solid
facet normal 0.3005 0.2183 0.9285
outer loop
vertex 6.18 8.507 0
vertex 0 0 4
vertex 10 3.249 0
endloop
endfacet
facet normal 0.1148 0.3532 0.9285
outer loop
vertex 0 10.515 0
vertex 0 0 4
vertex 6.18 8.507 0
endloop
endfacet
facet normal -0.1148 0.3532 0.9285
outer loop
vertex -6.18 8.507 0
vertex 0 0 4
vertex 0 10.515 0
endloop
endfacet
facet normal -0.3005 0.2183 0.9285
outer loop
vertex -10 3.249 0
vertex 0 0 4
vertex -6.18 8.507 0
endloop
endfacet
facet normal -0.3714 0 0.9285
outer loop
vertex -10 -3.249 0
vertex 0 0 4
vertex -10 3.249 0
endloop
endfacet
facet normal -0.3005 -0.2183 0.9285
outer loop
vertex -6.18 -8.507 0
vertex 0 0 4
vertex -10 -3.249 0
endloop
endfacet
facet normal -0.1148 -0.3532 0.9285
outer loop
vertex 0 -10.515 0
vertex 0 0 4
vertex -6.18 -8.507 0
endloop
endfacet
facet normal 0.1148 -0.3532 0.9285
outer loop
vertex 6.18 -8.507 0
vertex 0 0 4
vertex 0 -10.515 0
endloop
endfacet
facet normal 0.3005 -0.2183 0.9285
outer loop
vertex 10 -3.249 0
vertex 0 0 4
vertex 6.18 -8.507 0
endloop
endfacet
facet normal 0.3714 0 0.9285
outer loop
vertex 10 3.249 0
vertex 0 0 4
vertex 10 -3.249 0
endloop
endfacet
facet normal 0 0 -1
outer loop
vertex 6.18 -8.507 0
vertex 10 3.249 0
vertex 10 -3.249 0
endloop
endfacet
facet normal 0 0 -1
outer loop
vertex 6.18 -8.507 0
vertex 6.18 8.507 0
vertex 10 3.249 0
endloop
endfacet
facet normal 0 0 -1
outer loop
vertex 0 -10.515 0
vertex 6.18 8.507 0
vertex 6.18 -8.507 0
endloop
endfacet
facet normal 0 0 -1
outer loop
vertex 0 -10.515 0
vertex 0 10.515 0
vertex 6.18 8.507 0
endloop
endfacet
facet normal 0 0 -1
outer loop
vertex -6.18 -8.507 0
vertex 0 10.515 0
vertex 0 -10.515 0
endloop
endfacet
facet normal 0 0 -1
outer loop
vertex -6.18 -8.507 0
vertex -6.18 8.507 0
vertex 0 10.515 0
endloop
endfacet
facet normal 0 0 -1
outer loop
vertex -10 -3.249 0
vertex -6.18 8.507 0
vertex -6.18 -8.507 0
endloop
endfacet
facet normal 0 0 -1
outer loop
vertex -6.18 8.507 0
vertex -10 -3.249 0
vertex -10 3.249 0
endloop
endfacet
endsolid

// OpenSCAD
// file: transformations_oblomobka.scad
// Transformations
// (C) @oblomobka - 2014
// GPL3

// Transforma una forma en un sector según un ángulo dado.

module sector(	angle, 	// es el ángulo del sector, lo que quedará de la forma original
				d,		// valor auxiliar, será como mínimo igual al diámetro del cilindro que envuelve la forma original
				h		// valor auxiliar, será como mínimo igual a la altura del cilindro que envuelve la forma original
				){

POINTS=[	[0,0,-h],
		[0,0,h],
		[d*cos(0*angle/4),d*sin(0*angle/4),-h],
		[d*cos(0*angle/4),d*sin(0*angle/4),h],
		[d*cos(1*angle/4),d*sin(1*angle/4),-h],
		[d*cos(1*angle/4),d*sin(1*angle/4),h],
		[d*cos(2*angle/4),d*sin(2*angle/4),-h],
		[d*cos(2*angle/4),d*sin(2*angle/4),h],
		[d*cos(3*angle/4),d*sin(3*angle/4),-h],
		[d*cos(3*angle/4),d*sin(3*angle/4),h],
		[d*cos(4*angle/4),d*sin(4*angle/4),-h],
		[d*cos(4*angle/4),d*sin(4*angle/4),h],
		];

TRIANGLES=[	[0,1,2],
			[1,3,2],
			[2,3,4],
			[3,5,4],
			[4,5,6],
			[5,7,6],
			[6,7,8],
			[7,9,8],
			[8,9,10],
			[9,11,10],
			[10,11,0],
			[11,1,0],

			[5,3,1],
			[7,5,1],
			[9,7,1],
			[11,9,1],
			[0,2,4],
			[0,4,6],
			[0,6,8],
			[0,8,10]
			];

if(angle<=0 || angle>=360){
	child();
	}
	else{
		intersection(){
			polyhedron(points=POINTS,triangles=TRIANGLES);
			child();
			}
		}
}

//sector (150,40,10)cylinder(r=20,h=10); // Ejemplo de uso de la tansformación sector()
// file: functions_ext.scad
// Funciones sacadas de otras librerías y de diferentes autores

include <constants_oblomobka.scad>

/* A circular helix of radius a and pitch 2πb is described by the following parametrisation:
x(t) = a*cos(t),
y(t) = a*sin(t),
z(t) = b*t
Licensed under the MIT license.
© 2010 by Elmo Mäntynen
*/
function b(pitch) = pitch/(TAU);
function t(pitch, z) = z/b(pitch);
function helix_curve(pitch, radius, z) = [radius*cos(deg(t(pitch, z))), radius*sin(deg(t(pitch, z))), z];


/* Utility functions.
 * Originally by Hans Häggström, 2010.
 * Dual licenced under Creative Commons Attribution-Share Alike 3.0 and LGPL2 or later
 */
function distance(a, b) = sqrt( (a[0] - b[0])*(a[0] - b[0]) +
                                (a[1] - b[1])*(a[1] - b[1]) +
                                (a[2] - b[2])*(a[2] - b[2]) );

function length2(a) = sqrt( a[0]*a[0] + a[1]*a[1] );

function normalized(a) = a / (max(distance([0,0,0], a), 0.00001));

function normalized_axis(a) = 	a == "x" ? [1, 0, 0]:
                  			 	a == "y" ? [0, 1, 0]:
                   				a == "z" ? [0, 0, 1]: normalized(a);

function angleOfNormalizedVector(n) = [0, -atan2(n[2], length2([n[0], n[1]])), atan2(n[1], n[0]) ];

function angle(v) = angleOfNormalizedVector(normalized(v));

function angleBetweenTwoPoints(a, b) = angle(normalized(b-a));
// file: functions_oblomobka.scad
// Functions
// (C) @oblomobka - 2014
// GPL3

include <constants_oblomobka.scad>

// da el diámetro interior del cono(d1,d2,h) a una altura interior(hi) conocida
function di_cone(d1,d2,h,hi)=d2+(d1-d2)*(1-hi/h);

// da la altura interior del cono(d1,d2,h) a un diametro(di) conocido
function hi_cone(d1,d2,h,di)=-h*((di-d2)/(d1-d2)-1);

// 
function r_circle_intersection (d1,d2)=sqrt(pow(d1/2,2)-pow(d2/2,2));

// Relaciones entre radio, apotema y lado en un polígono de n lados
function side_apothem (apothem,n)=apothem*2*tan(180/n);
function apothem_radius(radius,n)=radius*cos(180/n);
function radius_apothem(apothem,n)=apothem/cos(180/n);
function side_radius (radius,n)=radius*2*sin(180/n);

// limita los posibles valores de x, que siempre estarán comprendidos entre un minimo(a) y un maximo(z)
function lim(a,x,z)=max(a,min(x,z));

// transforma angulo, radianes --> hexadecimal
function deg(angle) = 180*angle/PI;
// transforma angulo, hexadecimal --> radianes
function rad(angle) = angle*PI/180;
// file: constants_oblomobka.scad
// números transcendentes

TAU = 2*PI; //6.2831853071 (PI ya está definido en Openscad)
EULER=2.71828282;


// números algebraicos

PHI=(1+sqrt(5))/2;


// Vectores

X = [1, 0, 0];
Y = [0, 1, 0];
Z = [0, 0, 1];
// main file
// Shapes
// (C) @oblomobka - 2014
// GPL3

include <constants_oblomobka.scad>
include <functions_oblomobka.scad>
include <functions_ext.scad>

use <transformations_oblomobka.scad>

// --- Piramide con base circunscrita en un círculo definido en las variables
module pyramid_circumscribed (	n=4,			// nº lados de la base de la pirámide	
								d1=20,		// diámetro del círculo-base donde se circunscribe la pirámide
								d2=0,		// diámetro del círculo-punta donde se circunscribe la pirámide
								h=10			// altura de la pirámide
								){

if(n%2==0){
	rotate([0,0,180/n])
		cylinder (r1=d1/2/cos(180/n), r2=d2/2/cos(180/n), h=h, $fn=n);
	}
	else{
		rotate([0,0,90/n])
			cylinder (r1=d1/2/cos(180/n), r2=d2/2/cos(180/n), h=h, $fn=n);
		}

}
// ------- pyramid_circumscribed (n=n,d1=d1,d2=d2,h=h); -----------------

// --- Prisma con base circunscrita en un círculo definido en las variables
module prism_circumscribed (	n=4,			// nº lados de la base del prisma
							d=20,		// diámetro del círculo donde se circunscribe el prisma
							h=10			// altura del prisma
							){
if(n%2==0){
	rotate([0,0,180/n])
		cylinder (r=d/2/cos(180/n), h=h, $fn=n);
	}
	else{
		rotate([0,0,90/n])
			cylinder (r=d/2/cos(180/n), h=h, $fn=n);
		}
}
// ------- prism_circumscribed (n=n,d=d,h=h); -----------------



// Toros

// Definido por el diámetro exterior y el diámetro del círculo en revolución
module torusOD (d1,d2,resolution){
$fn=resolution;	
rotate_extrude(){
	translate([d1/2-d2/2,0,0])
		circle(r=d2/2);
	}
}

// Definido por el diámetro exterior y el diámetro interior
module torusOI (d1,d2,resolution){
$fn=resolution;	
d=(d1-d2)/2;
rotate_extrude(){
	translate([d1/2-d/2,0,0])
		circle(r=d/2);
	}
}

// Definido por el diámetro de la línea neutra y el diámetro del círculo en revolución
module torusND (d1,d2,resolution){
$fn=resolution;	
rotate_extrude(){
	translate([d1/2,0,0])
		circle(r=d2/2);
	}
}

module torus_sector(d1,d2,angle=360,mode=1,extreme=true,resolution=32){

if(angle<=0 || angle>=360){
	if(mode==1){torusOD(d1,d2,resolution=resolution);}
	else{if(mode==2){torusND(d1,d2,resolution=resolution);}
	else{if(mode==3){torusOI(d1,d2,resolution=resolution);}}}
	}

else{
	if(mode==1){
		union(){
			sector(angle,d1,d2/2)torusOD(d1,d2,resolution=resolution);
			if(extreme==true){
				translate([d1/2-d2/2,0,0])sphere(d2/2,$fn=resolution);
				translate([(d1/2-d2/2)*cos(angle),(d1/2-d2/2)*sin(angle),0])sphere(d2/2,$fn=resolution);
				}
			}
		}
	else{
		if(mode==2){
			union(){
				sector(angle,d1+d2,d2/2)torusND(d1,d2,resolution=resolution);
				if(extreme==true){
					translate([d1/2,0,0])sphere(d2/2,$fn=resolution);
					translate([d1/2*cos(angle),d1/2*sin(angle),0])sphere(d2/2,$fn=resolution);
					}
				}
			}
		else{
			if(mode==3){
				union(){
					sector(angle,d1,(d1-d2)/4)torusOI(d1,d2,resolution=resolution);
					if(extreme==true){
						translate([d1/2-(d1-d2)/4,0,0])sphere((d1-d2)/4,$fn=resolution);
						translate([(d1/2-(d1-d2)/4)*cos(angle),(d1/2-(d1-d2)/4)*sin(angle),0])sphere((d1-d2)/4,$fn=resolution);
						}
					}
				}
			}
		}
	}
}


// Tubos

module tubeOT (d,t,h,resolution=resolution){	
	difference(){
		cylinder(r=d/2,h=h,$fn=resolution);
		cylinder(r=(d-2*t)/2,h=3*h,center=true,$fn=resolution);
		}
}

// Definido por el diámetro exterior y el diámetro interior
module tubeOI (d1,d2,h,resolution=resolution){
	difference(){
		cylinder(r=d1/2,h=h,$fn=resolution);
		cylinder(r=d2/2,h=3*h,center=true,$fn=resolution);	
		}
}

// Definido por el diámetro de la línea neutra y el diámetro del círculo en revolución
module tubeNT (d,t,h,resolution=resolution){
	difference(){
		cylinder(r=(d+t)/2,h=h,$fn=resolution);
		cylinder(r=(d-t)/2,h=3*h,center=true,$fn=resolution);
	}
}

module tube_sector(d=25,t=2,h=1,angle=360,mode=1,extreme=true,resolution=32){

if(angle<=0 || angle>=360){
	if(mode==1){tubeOT(d,t,h,resolution=resolution);}
	else{if(mode==2){tubeNT(d,t,h,resolution=resolution);}
	else{if(mode==3){tubeOI(d,t,h,resolution=resolution);}}}
	}

else{
	if(mode==1){
		union(){
			sector(angle,d,h)tubeOT(d,t,h,resolution=resolution);
			if(extreme==true){
				translate([d/2-t/2,0,0])cylinder(r=t/2,h=h,$fn=resolution);
				translate([(d/2-t/2)*cos(angle),(d/2-t/2)*sin(angle),0])cylinder(r=t/2,h=h,$fn=resolution);;
				}
			}
		}
	else{
		if(mode==2){
			union(){
				sector(angle,d+t,h)tubeNT(d,t,h,resolution=resolution);
				if(extreme==true){
					translate([d/2,0,0])cylinder(r=t/2,h=h,$fn=resolution);
					translate([d/2*cos(angle),d/2*sin(angle),0])cylinder(r=t/2,h=h,$fn=resolution);
					}
				}
			}
		else{
			if(mode==3){
				union(){
					sector(angle,d,h)tubeOI(d,t,h,resolution=resolution);
					if(extreme==true){
						translate([d/2-(d-t)/4,0,0])cylinder(r=(d-t)/4,h=h,$fn=resolution);
						translate([(d/2-(d-t)/4)*cos(angle),(d/2-(d-t)/4)*sin(angle),0])cylinder(r=(d-t)/4,h=h,$fn=resolution);
						}
					}
				}
			}
		}
	}
}

//torus_sector(d1=15,d2=4,angle=215,mode=3,extreme=true,resolution=50);
//tube_sector(d=24,t=11,h=15,angle=250,mode=1,extreme=true,resolution=50);

pyramid_circumscribed(n=10,d=8,h=4);
